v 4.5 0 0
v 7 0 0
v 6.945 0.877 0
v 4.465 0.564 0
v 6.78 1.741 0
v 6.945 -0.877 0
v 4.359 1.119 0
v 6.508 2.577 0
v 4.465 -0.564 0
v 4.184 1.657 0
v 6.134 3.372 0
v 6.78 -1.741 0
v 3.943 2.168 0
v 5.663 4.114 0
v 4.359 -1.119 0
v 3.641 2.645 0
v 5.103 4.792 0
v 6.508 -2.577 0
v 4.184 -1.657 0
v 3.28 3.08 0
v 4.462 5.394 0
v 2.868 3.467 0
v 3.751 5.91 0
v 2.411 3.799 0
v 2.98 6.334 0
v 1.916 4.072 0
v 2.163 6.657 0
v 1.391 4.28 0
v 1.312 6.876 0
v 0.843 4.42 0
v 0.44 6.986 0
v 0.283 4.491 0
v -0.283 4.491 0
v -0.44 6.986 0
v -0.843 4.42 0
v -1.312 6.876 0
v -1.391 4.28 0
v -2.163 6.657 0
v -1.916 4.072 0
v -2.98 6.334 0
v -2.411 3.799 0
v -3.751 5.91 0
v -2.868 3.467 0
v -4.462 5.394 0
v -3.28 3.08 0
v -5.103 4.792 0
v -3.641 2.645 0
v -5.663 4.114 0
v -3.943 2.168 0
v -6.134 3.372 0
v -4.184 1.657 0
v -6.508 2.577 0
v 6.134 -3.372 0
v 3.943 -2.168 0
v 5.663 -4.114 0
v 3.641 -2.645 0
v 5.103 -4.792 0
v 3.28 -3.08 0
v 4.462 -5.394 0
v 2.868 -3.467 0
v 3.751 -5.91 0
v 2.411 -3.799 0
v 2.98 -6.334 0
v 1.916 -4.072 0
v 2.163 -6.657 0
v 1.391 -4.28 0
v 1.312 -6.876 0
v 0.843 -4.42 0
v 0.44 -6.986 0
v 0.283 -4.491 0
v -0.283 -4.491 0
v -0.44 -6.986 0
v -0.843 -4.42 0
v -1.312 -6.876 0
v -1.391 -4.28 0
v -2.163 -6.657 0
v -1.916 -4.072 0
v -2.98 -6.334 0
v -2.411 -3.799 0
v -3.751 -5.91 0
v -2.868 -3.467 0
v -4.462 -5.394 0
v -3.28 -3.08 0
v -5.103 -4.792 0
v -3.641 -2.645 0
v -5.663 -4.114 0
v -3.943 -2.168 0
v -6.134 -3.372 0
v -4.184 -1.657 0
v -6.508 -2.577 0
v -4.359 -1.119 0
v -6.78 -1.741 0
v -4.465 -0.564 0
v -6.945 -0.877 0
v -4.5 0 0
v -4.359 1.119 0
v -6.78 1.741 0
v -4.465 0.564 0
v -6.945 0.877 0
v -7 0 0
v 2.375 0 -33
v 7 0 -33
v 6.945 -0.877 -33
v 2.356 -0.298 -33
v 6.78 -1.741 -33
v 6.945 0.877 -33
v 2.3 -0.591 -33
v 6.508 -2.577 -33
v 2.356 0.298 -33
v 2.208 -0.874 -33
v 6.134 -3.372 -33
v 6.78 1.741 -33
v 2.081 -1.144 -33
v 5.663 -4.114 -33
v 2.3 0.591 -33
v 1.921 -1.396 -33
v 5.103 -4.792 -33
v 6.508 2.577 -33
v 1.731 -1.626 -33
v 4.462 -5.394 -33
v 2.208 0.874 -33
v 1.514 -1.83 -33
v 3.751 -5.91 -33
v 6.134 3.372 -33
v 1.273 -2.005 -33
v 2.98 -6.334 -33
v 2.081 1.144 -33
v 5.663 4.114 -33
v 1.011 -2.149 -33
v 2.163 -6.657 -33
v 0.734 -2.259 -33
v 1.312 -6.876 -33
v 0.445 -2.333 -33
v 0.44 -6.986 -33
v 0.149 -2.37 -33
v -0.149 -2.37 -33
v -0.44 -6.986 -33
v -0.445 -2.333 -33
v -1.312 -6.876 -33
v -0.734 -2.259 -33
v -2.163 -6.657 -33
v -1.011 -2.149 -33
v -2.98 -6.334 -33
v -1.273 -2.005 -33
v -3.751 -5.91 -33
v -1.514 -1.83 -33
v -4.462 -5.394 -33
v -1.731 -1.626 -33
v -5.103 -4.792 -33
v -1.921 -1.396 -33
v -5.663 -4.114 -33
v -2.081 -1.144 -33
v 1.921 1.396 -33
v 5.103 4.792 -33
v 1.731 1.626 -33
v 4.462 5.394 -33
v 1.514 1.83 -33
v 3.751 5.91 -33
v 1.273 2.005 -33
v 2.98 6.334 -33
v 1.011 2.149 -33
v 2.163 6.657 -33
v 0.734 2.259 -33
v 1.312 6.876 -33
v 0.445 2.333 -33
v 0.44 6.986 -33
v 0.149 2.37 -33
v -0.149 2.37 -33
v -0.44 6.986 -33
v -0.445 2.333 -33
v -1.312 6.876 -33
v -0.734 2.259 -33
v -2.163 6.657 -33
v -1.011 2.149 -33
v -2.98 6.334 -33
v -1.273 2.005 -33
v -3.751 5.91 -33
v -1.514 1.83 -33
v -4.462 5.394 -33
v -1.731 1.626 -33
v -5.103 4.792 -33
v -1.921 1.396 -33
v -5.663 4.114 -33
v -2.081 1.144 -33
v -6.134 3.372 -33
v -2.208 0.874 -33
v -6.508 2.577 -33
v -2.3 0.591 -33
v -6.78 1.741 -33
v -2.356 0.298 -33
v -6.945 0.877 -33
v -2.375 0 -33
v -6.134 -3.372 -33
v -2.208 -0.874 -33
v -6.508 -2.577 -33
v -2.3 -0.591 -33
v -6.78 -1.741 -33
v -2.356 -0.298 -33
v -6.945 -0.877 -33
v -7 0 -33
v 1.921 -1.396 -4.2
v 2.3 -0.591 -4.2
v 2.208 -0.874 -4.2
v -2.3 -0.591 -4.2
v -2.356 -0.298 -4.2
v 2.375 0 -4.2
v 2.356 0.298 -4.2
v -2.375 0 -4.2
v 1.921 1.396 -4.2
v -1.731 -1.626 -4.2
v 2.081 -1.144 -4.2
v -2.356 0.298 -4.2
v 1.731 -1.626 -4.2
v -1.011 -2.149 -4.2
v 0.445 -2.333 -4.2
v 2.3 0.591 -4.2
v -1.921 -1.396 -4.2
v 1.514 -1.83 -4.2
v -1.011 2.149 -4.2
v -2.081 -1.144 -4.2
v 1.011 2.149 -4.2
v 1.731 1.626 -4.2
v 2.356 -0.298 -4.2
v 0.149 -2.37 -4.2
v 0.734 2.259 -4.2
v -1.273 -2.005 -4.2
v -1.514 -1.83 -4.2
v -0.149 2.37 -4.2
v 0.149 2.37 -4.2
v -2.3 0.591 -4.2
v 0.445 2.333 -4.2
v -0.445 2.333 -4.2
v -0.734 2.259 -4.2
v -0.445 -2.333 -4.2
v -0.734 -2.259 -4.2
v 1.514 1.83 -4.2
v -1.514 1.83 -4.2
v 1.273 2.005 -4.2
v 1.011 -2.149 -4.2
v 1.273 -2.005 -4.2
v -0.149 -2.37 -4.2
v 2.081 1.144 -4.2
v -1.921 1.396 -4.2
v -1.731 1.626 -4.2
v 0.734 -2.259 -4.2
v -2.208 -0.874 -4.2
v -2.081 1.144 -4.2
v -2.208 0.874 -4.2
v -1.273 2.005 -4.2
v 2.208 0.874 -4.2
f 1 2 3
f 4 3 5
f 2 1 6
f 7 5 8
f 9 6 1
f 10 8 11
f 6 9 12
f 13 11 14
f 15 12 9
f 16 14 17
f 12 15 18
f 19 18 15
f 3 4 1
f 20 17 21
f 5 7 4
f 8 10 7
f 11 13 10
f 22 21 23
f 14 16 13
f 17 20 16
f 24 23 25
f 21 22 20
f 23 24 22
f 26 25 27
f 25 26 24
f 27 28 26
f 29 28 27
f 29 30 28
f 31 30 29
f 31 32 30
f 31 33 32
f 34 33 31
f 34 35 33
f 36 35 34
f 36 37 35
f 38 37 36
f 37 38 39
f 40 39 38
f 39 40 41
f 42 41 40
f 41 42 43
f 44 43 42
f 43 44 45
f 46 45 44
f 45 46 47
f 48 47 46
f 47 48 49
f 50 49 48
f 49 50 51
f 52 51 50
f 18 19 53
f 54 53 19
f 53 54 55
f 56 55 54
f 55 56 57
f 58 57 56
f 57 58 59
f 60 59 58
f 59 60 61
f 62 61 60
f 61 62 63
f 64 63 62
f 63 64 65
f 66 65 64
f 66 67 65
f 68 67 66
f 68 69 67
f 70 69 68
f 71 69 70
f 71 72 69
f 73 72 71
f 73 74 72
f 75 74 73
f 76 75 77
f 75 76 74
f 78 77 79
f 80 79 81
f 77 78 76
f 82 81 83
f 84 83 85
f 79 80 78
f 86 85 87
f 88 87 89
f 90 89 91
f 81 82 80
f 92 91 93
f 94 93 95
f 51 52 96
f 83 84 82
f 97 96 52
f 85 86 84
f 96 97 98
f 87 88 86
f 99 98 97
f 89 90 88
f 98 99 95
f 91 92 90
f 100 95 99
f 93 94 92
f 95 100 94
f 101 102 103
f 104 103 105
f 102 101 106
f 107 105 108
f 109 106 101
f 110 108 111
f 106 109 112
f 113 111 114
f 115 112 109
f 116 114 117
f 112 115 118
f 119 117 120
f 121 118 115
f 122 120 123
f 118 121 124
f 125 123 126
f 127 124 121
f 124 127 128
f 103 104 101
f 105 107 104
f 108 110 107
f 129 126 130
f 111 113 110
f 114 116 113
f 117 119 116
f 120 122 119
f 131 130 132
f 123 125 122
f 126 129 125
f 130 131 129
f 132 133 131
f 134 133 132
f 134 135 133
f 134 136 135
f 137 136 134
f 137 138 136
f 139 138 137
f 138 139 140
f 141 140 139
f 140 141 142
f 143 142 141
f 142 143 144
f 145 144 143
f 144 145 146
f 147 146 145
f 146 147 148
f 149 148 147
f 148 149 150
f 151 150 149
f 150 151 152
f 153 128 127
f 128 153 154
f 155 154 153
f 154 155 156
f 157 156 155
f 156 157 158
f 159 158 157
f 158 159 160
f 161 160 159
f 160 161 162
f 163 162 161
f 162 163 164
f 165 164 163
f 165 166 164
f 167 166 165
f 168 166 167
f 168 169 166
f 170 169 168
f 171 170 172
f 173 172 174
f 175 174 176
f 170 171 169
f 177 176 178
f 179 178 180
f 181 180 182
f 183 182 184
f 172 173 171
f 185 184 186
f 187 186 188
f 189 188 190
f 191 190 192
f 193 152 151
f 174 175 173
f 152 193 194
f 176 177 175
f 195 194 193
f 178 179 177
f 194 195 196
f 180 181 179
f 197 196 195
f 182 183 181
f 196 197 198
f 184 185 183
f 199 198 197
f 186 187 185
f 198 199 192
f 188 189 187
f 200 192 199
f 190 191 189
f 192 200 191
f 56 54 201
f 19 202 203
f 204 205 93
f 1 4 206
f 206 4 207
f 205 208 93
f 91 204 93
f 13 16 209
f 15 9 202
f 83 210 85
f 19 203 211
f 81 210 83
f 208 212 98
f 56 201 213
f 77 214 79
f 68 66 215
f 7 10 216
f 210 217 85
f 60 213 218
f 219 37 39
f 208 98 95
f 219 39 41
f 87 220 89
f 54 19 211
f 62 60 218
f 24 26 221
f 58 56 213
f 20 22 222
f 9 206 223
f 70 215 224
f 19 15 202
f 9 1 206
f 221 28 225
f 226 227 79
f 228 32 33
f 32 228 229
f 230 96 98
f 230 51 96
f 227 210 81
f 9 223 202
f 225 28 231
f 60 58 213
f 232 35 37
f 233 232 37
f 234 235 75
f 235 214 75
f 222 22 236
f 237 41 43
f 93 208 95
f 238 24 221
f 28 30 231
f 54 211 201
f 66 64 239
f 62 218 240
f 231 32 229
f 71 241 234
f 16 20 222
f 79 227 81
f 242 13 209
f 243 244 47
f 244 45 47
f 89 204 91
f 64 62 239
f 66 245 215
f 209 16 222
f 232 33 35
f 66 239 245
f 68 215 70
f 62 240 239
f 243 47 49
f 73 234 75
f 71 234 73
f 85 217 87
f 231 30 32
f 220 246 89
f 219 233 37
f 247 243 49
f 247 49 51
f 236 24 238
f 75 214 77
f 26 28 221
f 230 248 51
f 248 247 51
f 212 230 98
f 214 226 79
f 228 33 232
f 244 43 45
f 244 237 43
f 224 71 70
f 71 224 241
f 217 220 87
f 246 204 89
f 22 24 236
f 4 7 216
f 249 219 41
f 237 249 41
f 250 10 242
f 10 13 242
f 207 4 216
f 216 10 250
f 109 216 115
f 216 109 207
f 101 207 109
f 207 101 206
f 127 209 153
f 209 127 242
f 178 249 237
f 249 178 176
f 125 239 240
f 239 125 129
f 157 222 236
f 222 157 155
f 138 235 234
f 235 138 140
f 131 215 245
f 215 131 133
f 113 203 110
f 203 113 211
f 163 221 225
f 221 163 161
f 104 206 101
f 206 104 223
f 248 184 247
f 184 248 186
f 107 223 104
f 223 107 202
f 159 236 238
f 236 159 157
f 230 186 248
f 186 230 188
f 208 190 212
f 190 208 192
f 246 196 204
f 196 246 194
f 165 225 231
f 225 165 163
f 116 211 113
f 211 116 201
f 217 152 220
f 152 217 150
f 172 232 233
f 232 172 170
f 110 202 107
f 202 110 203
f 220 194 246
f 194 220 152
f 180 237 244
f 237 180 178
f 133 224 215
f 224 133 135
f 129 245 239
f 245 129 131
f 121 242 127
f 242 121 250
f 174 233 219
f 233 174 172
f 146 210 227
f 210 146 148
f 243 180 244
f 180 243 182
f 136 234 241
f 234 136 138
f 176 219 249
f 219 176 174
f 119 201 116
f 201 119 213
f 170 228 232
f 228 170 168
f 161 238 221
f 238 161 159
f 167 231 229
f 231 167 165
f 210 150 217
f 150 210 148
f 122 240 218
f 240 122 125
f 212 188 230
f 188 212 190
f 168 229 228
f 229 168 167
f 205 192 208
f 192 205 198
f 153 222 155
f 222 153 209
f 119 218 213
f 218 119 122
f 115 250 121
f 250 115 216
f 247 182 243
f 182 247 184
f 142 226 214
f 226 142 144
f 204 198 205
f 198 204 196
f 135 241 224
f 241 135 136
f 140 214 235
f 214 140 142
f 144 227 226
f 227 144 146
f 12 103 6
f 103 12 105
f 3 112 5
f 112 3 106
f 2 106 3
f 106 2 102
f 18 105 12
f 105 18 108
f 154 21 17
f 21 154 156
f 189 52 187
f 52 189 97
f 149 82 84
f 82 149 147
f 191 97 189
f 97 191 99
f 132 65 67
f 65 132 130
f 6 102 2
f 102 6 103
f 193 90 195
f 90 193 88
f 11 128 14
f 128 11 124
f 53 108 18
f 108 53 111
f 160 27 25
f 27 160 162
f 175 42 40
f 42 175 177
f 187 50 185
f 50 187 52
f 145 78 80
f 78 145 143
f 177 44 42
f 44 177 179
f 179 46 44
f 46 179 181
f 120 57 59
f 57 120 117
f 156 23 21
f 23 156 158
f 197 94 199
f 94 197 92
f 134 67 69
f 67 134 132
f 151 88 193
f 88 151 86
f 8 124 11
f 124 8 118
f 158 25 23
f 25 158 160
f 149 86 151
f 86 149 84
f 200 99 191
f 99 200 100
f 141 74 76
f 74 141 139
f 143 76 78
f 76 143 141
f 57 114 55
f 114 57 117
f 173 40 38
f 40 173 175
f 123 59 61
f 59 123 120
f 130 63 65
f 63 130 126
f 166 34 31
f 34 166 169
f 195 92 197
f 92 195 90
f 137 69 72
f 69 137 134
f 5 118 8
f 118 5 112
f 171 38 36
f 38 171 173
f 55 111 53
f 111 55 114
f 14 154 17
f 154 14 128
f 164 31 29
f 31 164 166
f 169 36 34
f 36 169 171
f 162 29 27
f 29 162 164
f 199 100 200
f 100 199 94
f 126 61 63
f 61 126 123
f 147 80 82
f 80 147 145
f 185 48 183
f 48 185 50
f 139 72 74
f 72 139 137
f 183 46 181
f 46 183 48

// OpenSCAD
$fn = 50;


difference() {
	union() {
		translate(v = [0, 0, -33.0000000000]) {
			cylinder(h = 33, r = 7.0000000000);
		}
	}
	union() {
		translate(v = [0, 0, 0]) {
			rotate(a = [0, 0, 0]) {
				difference() {
					union() {
						#translate(v = [0, 0, -33.0000000000]) {
							cylinder(h = 33, r = 2.2500000000);
						}
						#translate(v = [0, 0, -4.2000000000]) {
							cylinder(h = 4.2000000000, r1 = 2.3750000000, r2 = 4.5000000000);
						}
						#translate(v = [0, 0, -33.0000000000]) {
							cylinder(h = 33, r = 2.3750000000);
						}
						#translate(v = [0, 0, -33.0000000000]) {
							cylinder(h = 33, r = 2.2500000000);
						}
					}
					union();
				}
			}
		}
	}
}
